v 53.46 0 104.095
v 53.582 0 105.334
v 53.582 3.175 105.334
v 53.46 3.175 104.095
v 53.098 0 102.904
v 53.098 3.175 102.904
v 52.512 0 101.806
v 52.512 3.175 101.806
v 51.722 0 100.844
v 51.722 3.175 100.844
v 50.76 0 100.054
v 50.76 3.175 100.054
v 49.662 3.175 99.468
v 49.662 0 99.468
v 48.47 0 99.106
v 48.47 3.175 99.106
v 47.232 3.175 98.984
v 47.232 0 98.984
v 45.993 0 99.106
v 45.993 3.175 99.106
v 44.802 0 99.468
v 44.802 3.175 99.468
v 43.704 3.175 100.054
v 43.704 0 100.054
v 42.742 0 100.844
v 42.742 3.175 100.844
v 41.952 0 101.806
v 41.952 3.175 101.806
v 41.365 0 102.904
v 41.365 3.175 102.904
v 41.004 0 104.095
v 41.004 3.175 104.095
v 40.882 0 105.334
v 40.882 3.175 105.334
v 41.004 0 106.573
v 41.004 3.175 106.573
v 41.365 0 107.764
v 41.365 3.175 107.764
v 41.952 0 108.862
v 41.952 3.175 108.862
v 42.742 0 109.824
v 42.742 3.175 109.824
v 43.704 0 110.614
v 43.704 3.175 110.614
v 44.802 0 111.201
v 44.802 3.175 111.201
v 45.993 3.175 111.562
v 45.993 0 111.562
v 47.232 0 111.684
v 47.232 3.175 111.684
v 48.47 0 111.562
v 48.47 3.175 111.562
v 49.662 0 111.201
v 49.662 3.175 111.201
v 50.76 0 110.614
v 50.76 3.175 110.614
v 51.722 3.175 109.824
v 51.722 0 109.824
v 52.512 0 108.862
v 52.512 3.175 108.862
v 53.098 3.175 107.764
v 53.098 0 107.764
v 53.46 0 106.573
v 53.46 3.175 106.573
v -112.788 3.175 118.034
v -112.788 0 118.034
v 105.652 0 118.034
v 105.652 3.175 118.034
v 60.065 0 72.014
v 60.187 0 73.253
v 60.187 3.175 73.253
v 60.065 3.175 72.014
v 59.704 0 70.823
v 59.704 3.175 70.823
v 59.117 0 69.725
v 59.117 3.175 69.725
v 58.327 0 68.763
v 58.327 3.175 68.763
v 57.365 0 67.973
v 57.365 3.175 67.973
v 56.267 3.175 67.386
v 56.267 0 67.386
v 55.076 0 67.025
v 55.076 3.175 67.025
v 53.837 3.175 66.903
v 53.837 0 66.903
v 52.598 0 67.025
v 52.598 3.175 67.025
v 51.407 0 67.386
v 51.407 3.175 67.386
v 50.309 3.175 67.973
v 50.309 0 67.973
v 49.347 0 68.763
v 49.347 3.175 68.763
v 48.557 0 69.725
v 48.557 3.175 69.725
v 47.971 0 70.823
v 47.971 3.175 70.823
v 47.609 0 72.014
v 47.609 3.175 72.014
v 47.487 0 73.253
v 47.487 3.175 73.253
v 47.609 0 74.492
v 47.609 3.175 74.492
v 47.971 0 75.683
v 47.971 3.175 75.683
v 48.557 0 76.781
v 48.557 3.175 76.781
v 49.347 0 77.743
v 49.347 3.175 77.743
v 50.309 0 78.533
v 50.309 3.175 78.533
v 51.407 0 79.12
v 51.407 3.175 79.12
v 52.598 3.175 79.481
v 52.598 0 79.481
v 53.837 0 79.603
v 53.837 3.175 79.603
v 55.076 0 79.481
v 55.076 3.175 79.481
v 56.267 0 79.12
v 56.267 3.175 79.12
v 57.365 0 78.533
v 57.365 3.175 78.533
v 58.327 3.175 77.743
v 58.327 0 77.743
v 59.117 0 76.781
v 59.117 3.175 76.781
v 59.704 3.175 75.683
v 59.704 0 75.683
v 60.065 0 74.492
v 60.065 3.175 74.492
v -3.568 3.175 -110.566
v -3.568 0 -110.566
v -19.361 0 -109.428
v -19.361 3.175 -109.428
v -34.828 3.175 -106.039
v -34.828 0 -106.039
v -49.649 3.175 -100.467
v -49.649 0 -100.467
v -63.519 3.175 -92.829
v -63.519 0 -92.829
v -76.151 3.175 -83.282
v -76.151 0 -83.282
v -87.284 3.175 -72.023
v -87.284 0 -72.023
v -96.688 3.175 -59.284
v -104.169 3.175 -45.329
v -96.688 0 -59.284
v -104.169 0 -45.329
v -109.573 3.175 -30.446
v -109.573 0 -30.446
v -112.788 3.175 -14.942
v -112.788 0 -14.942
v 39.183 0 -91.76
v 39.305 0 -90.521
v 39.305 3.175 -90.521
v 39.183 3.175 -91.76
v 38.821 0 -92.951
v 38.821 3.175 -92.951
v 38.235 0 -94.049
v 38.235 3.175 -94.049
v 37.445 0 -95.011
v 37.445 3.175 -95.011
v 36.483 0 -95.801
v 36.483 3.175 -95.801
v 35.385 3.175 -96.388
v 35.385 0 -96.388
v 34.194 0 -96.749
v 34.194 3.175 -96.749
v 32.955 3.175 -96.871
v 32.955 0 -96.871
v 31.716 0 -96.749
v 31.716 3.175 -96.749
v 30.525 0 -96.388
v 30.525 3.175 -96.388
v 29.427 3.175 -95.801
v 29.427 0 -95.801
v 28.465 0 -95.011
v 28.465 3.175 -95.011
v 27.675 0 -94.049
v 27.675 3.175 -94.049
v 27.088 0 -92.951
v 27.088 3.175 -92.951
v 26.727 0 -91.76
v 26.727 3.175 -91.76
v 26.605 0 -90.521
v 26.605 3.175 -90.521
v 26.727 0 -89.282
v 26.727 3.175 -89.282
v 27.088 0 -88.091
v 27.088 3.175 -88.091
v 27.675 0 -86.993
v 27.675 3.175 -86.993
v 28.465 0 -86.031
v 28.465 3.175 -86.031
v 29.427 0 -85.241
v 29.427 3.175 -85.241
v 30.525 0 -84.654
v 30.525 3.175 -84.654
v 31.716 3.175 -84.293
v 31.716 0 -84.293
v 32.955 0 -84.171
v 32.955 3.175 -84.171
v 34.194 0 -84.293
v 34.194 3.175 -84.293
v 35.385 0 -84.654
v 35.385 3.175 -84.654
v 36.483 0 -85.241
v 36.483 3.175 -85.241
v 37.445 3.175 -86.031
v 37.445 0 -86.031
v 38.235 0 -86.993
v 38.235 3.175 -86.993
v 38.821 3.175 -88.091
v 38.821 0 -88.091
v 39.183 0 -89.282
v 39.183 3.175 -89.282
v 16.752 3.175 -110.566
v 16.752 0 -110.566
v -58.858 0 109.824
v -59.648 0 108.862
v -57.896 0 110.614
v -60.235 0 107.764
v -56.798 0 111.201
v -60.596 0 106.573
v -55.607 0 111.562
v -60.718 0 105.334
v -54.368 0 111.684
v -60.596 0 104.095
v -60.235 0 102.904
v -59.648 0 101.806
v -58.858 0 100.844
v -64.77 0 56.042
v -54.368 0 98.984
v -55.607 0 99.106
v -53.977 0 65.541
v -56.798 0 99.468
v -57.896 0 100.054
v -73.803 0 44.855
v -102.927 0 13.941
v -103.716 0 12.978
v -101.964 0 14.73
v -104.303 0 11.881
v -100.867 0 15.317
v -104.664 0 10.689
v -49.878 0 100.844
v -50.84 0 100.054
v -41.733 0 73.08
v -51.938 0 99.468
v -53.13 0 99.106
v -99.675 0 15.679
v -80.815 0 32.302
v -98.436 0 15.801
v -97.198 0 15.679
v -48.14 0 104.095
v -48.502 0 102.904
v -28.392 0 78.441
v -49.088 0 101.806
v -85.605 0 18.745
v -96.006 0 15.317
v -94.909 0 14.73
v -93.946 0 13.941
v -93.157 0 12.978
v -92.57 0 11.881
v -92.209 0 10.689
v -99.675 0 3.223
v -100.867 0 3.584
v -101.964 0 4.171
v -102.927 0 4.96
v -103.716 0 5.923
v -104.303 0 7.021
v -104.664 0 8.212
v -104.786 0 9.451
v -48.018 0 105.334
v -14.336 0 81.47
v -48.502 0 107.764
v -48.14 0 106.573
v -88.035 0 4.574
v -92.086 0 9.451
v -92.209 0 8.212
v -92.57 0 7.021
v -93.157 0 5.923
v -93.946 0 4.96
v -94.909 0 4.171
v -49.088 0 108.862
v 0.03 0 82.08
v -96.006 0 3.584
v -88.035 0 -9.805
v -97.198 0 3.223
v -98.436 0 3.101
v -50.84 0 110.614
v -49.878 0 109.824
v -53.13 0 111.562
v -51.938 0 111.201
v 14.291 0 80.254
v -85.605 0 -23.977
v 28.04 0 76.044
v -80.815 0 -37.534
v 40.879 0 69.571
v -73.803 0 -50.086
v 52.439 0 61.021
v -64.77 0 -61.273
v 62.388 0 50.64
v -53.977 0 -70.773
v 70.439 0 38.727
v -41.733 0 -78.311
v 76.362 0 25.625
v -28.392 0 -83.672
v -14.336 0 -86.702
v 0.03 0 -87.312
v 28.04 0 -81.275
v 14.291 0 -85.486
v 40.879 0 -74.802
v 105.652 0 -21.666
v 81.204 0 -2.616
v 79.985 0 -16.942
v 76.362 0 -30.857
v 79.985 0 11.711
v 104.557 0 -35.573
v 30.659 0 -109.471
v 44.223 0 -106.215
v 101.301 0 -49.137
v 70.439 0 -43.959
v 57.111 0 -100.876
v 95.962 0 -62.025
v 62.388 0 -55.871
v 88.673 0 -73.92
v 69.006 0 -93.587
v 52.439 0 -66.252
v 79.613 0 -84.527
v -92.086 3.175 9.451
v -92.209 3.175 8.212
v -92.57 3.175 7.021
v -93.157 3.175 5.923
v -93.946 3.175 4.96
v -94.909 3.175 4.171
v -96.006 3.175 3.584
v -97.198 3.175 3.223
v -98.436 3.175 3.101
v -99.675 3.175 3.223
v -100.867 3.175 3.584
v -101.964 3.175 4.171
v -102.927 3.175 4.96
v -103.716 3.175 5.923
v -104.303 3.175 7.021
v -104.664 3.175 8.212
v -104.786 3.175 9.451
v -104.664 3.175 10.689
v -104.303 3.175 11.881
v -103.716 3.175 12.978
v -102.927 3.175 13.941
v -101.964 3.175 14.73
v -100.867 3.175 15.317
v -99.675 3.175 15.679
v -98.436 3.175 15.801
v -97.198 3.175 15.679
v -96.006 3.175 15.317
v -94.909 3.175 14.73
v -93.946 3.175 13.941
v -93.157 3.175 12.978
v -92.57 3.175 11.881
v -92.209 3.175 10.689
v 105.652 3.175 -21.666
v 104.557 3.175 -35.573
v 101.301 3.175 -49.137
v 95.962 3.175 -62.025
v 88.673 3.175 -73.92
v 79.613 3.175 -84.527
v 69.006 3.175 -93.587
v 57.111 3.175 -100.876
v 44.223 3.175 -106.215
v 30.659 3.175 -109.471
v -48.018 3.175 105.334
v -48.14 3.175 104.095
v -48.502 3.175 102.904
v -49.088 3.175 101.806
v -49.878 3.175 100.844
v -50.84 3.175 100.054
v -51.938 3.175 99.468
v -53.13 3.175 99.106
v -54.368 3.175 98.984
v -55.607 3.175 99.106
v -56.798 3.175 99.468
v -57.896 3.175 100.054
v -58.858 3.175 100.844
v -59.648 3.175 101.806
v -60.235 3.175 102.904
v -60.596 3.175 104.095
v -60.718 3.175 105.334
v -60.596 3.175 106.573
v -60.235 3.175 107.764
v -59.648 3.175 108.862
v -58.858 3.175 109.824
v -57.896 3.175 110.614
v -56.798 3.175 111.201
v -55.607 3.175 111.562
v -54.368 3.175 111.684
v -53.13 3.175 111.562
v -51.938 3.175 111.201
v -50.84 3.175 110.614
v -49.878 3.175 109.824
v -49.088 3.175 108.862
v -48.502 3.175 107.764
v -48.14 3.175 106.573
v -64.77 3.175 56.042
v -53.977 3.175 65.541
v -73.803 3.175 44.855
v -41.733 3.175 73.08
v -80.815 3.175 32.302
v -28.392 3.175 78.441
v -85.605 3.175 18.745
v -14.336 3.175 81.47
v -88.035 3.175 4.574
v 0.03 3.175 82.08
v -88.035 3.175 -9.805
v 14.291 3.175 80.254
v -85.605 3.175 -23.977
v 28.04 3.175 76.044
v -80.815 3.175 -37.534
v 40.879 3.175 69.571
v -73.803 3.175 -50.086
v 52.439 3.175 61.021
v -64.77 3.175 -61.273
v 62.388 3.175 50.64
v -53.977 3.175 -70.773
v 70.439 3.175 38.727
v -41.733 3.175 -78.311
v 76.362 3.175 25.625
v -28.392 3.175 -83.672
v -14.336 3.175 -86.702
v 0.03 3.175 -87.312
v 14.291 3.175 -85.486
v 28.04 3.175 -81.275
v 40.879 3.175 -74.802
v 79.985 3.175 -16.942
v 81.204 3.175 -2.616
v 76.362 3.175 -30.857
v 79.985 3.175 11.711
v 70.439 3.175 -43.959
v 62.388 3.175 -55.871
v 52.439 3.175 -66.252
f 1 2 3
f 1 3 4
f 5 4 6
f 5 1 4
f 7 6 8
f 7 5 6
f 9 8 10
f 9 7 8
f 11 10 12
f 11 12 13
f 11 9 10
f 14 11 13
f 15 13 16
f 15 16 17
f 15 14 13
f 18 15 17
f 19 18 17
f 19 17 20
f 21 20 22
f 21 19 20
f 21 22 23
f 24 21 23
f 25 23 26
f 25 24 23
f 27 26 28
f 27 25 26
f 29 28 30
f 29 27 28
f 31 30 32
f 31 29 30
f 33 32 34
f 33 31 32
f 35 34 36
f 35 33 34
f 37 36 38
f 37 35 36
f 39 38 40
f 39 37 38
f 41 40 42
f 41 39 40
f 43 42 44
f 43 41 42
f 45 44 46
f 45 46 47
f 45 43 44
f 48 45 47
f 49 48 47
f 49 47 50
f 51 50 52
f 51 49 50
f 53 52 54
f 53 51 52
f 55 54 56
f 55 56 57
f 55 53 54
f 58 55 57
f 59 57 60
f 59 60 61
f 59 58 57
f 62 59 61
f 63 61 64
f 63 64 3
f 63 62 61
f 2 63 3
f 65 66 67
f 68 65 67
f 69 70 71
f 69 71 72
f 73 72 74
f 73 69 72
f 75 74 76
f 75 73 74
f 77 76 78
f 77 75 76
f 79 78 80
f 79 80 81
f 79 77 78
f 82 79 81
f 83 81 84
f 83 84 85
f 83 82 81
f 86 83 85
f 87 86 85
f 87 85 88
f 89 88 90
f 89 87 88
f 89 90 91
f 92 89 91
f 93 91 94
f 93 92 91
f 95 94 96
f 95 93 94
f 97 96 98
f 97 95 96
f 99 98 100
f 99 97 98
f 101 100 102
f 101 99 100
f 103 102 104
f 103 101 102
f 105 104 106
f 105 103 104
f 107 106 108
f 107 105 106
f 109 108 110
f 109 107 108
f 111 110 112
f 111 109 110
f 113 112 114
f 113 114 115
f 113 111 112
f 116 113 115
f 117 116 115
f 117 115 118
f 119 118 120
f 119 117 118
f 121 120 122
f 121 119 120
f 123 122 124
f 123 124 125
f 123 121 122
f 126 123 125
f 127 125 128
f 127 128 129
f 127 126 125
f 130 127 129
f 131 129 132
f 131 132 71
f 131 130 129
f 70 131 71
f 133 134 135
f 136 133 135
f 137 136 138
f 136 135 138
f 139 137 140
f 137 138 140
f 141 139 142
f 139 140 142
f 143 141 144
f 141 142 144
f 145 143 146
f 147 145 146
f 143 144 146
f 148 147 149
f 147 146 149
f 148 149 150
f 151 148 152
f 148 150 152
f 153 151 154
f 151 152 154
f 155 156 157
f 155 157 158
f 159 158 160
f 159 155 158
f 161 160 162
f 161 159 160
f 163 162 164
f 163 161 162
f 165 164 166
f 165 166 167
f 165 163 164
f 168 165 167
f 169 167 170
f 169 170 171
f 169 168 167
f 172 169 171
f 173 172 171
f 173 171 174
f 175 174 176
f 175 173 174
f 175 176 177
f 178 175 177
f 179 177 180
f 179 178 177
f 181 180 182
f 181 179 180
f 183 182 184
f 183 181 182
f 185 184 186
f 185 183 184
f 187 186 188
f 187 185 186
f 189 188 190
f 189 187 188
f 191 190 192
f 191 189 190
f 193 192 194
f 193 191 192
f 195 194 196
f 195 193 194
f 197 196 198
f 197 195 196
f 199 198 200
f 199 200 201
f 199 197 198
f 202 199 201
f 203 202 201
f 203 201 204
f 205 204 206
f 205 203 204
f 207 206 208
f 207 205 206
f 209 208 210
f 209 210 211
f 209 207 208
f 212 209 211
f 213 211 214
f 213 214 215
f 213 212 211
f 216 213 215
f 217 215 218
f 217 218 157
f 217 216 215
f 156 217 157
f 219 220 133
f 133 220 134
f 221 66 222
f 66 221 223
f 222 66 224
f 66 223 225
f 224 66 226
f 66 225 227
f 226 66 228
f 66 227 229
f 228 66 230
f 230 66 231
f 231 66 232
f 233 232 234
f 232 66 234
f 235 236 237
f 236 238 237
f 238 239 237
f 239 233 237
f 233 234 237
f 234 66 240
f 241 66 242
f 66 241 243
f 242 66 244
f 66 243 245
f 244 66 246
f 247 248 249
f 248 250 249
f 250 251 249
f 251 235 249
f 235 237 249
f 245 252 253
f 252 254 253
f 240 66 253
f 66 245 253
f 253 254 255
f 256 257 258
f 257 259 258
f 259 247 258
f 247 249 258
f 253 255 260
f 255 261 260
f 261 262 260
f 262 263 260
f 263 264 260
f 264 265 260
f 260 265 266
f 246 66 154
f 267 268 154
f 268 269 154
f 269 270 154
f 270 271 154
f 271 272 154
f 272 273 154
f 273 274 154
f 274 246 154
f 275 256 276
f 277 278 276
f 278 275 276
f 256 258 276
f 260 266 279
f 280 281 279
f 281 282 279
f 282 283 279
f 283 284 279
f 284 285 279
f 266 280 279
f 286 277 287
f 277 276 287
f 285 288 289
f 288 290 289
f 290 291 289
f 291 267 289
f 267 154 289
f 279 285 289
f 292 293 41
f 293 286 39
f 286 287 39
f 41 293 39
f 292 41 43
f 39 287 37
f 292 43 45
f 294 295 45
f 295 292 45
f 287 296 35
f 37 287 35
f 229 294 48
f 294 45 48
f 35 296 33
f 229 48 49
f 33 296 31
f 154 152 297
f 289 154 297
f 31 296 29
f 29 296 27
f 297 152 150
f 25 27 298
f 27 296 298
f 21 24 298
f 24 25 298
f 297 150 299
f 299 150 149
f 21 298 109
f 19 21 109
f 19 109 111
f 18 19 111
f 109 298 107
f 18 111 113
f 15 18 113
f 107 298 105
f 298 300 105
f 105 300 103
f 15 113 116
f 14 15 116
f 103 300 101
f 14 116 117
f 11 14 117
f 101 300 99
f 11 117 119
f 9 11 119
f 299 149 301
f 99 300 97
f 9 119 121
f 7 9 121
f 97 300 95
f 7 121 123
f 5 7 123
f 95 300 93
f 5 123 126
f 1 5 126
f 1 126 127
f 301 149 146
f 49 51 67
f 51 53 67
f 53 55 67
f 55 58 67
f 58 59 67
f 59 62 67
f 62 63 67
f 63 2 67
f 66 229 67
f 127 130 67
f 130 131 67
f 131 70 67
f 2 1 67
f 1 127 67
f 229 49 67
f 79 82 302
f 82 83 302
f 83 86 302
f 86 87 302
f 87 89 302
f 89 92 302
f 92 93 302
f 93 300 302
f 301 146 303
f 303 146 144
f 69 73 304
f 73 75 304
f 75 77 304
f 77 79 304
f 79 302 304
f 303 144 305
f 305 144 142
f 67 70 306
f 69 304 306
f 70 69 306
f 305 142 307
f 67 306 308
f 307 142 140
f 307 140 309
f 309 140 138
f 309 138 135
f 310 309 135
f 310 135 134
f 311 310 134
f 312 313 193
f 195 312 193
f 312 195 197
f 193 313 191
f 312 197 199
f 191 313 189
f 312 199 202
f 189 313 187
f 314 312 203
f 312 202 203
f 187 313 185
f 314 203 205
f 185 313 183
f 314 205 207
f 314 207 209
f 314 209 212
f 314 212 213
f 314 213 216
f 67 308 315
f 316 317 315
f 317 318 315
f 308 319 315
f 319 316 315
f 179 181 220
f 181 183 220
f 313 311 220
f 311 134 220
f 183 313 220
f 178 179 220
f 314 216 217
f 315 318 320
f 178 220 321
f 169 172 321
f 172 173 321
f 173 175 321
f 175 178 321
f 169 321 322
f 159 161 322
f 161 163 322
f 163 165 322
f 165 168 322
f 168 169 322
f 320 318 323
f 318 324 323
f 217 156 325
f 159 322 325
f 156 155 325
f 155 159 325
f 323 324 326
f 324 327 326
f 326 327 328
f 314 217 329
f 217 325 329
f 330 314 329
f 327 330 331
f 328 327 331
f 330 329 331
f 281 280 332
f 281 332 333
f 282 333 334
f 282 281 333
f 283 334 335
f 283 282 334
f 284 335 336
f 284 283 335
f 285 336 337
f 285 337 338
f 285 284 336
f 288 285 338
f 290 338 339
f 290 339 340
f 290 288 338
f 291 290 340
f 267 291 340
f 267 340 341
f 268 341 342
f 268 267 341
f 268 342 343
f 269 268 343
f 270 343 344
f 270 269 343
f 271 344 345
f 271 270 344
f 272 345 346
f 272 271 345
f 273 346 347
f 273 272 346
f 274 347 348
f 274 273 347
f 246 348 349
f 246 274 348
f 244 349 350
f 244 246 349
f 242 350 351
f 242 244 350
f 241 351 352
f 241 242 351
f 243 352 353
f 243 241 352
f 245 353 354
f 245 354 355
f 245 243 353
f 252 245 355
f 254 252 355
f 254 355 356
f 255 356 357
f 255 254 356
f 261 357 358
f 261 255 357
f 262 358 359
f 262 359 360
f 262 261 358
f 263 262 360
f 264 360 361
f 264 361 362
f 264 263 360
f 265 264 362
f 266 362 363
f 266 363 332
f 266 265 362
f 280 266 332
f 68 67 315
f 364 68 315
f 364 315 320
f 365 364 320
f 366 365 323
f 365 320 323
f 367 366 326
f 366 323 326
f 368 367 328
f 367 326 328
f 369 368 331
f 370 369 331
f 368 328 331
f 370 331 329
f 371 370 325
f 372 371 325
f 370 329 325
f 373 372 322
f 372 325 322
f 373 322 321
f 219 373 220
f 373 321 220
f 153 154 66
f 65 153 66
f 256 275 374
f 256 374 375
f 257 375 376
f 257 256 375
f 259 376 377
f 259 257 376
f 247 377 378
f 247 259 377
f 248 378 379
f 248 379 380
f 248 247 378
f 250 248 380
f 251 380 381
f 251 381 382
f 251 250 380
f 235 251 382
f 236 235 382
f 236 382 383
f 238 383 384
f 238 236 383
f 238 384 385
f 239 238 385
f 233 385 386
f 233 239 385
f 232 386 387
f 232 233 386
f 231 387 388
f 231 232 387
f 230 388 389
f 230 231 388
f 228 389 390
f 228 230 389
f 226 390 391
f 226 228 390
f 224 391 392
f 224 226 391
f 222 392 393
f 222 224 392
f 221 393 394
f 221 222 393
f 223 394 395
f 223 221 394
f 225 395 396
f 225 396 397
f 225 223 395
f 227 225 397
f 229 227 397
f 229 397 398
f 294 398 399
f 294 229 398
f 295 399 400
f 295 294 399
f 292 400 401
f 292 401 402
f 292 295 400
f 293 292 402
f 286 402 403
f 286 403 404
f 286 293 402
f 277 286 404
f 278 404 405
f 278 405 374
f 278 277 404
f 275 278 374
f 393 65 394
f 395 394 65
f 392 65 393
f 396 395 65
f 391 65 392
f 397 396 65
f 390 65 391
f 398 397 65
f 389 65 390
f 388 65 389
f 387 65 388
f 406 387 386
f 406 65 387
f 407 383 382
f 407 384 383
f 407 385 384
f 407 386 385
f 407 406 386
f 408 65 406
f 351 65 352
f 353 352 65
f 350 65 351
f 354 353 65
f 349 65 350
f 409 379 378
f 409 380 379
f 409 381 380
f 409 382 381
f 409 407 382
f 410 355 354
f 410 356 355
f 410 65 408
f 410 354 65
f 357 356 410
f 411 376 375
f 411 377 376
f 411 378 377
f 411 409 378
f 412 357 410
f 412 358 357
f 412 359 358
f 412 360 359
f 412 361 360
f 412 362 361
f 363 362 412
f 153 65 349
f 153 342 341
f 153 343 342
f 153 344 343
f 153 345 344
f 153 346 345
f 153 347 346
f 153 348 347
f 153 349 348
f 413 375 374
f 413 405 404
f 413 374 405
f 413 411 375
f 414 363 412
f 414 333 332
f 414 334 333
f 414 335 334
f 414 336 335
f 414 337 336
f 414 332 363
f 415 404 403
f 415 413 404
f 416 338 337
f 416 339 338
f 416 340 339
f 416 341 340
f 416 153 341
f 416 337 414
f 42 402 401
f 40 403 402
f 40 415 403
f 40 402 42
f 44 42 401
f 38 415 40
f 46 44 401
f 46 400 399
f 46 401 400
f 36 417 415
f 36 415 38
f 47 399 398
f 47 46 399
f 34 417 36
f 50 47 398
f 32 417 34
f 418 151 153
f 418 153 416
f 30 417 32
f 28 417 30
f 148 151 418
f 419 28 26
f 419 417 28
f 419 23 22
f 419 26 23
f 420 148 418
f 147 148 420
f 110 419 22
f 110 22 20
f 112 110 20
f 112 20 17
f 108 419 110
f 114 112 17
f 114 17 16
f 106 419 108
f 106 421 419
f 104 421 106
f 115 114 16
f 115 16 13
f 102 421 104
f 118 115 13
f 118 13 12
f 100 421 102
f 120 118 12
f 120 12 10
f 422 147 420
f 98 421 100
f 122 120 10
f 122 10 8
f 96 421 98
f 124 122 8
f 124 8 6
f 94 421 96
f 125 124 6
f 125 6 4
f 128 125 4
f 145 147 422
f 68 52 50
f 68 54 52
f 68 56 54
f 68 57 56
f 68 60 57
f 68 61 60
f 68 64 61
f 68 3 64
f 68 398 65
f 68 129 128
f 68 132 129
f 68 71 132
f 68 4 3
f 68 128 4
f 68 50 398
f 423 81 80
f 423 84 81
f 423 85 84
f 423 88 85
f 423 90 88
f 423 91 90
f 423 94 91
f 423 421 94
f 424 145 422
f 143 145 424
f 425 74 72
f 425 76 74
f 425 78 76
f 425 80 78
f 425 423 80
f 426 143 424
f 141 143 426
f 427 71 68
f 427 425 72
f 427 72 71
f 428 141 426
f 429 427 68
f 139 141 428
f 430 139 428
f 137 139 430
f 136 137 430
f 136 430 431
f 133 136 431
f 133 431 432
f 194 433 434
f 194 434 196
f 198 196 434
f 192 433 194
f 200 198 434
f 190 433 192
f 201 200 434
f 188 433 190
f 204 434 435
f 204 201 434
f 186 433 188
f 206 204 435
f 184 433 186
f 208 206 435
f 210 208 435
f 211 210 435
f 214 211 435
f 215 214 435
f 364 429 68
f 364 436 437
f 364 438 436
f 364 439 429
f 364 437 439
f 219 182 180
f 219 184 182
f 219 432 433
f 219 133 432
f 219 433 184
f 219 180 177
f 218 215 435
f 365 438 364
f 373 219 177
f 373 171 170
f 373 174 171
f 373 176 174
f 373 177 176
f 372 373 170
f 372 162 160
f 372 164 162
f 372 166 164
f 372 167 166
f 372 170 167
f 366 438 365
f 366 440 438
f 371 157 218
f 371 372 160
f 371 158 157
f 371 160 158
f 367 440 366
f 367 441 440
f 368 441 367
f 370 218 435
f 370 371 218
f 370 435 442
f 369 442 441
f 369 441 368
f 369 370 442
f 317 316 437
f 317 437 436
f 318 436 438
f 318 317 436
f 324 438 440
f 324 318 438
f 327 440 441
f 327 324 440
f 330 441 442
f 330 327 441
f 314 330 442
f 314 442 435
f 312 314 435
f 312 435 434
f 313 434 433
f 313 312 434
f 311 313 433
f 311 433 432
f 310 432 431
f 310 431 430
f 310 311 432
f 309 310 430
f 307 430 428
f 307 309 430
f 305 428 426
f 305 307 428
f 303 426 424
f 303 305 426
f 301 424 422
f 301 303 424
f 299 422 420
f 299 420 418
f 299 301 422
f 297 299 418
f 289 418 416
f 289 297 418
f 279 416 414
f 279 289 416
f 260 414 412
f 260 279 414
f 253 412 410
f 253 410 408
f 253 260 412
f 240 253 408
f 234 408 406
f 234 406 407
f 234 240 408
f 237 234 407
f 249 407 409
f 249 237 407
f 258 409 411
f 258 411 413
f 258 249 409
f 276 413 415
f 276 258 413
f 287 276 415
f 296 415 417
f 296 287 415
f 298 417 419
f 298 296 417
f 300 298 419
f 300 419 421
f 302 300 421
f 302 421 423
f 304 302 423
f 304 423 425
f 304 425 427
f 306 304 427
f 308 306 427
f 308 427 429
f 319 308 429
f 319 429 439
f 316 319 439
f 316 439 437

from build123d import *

# Parameters (mm, degrees)
SKETCH1_R           = 84.7725
SKETCH1_R_2         = 6.35
BOSS_EXTRUDE1_DEPTH = 3.175


with BuildPart() as part:
    # Sketch1 → Boss-Extrude1 (new body)
    with BuildSketch(Plane(origin=(0, 0, 0), x_dir=(1, 0, 0), z_dir=(0, 1, 0))):
        with BuildLine():
            Line((16.751670796, 110.565701996), (-3.568329204, 110.565701996))
            ThreePointArc((-3.568329204, 110.565701996), (-76.150812933, 83.28188355), (-112.788329204, 14.942172584))
            Line((-112.788329204, 14.942172584), (-112.788329204, -118.034298004))
            Line((-112.788329204, -118.034298004), (105.651670796, -118.034298004))
            Line((105.651670796, -118.034298004), (105.651670796, 21.665701996))
            ThreePointArc((105.651670796, 21.665701996), (79.613463644, 84.527494844), (16.751670796, 110.565701996))
        make_face()
        with Locations((-3.568329204, 2.615701996)):
            Circle(SKETCH1_R, mode=Mode.SUBTRACT)
        with Locations((-98.436496296, -9.450545062)):
            Circle(SKETCH1_R_2, mode=Mode.SUBTRACT)
        with Locations((-54.368329204, -105.334298004)):
            Circle(SKETCH1_R_2, mode=Mode.SUBTRACT)
        with Locations((47.231670796, -105.334298004)):
            Circle(SKETCH1_R_2, mode=Mode.SUBTRACT)
        with Locations((32.954821104, 90.521109481)):
            Circle(SKETCH1_R_2, mode=Mode.SUBTRACT)
        with Locations((53.837154897, -73.252936495)):
            Circle(SKETCH1_R_2, mode=Mode.SUBTRACT)
    extrude(amount=BOSS_EXTRUDE1_DEPTH)


solid = part.part
